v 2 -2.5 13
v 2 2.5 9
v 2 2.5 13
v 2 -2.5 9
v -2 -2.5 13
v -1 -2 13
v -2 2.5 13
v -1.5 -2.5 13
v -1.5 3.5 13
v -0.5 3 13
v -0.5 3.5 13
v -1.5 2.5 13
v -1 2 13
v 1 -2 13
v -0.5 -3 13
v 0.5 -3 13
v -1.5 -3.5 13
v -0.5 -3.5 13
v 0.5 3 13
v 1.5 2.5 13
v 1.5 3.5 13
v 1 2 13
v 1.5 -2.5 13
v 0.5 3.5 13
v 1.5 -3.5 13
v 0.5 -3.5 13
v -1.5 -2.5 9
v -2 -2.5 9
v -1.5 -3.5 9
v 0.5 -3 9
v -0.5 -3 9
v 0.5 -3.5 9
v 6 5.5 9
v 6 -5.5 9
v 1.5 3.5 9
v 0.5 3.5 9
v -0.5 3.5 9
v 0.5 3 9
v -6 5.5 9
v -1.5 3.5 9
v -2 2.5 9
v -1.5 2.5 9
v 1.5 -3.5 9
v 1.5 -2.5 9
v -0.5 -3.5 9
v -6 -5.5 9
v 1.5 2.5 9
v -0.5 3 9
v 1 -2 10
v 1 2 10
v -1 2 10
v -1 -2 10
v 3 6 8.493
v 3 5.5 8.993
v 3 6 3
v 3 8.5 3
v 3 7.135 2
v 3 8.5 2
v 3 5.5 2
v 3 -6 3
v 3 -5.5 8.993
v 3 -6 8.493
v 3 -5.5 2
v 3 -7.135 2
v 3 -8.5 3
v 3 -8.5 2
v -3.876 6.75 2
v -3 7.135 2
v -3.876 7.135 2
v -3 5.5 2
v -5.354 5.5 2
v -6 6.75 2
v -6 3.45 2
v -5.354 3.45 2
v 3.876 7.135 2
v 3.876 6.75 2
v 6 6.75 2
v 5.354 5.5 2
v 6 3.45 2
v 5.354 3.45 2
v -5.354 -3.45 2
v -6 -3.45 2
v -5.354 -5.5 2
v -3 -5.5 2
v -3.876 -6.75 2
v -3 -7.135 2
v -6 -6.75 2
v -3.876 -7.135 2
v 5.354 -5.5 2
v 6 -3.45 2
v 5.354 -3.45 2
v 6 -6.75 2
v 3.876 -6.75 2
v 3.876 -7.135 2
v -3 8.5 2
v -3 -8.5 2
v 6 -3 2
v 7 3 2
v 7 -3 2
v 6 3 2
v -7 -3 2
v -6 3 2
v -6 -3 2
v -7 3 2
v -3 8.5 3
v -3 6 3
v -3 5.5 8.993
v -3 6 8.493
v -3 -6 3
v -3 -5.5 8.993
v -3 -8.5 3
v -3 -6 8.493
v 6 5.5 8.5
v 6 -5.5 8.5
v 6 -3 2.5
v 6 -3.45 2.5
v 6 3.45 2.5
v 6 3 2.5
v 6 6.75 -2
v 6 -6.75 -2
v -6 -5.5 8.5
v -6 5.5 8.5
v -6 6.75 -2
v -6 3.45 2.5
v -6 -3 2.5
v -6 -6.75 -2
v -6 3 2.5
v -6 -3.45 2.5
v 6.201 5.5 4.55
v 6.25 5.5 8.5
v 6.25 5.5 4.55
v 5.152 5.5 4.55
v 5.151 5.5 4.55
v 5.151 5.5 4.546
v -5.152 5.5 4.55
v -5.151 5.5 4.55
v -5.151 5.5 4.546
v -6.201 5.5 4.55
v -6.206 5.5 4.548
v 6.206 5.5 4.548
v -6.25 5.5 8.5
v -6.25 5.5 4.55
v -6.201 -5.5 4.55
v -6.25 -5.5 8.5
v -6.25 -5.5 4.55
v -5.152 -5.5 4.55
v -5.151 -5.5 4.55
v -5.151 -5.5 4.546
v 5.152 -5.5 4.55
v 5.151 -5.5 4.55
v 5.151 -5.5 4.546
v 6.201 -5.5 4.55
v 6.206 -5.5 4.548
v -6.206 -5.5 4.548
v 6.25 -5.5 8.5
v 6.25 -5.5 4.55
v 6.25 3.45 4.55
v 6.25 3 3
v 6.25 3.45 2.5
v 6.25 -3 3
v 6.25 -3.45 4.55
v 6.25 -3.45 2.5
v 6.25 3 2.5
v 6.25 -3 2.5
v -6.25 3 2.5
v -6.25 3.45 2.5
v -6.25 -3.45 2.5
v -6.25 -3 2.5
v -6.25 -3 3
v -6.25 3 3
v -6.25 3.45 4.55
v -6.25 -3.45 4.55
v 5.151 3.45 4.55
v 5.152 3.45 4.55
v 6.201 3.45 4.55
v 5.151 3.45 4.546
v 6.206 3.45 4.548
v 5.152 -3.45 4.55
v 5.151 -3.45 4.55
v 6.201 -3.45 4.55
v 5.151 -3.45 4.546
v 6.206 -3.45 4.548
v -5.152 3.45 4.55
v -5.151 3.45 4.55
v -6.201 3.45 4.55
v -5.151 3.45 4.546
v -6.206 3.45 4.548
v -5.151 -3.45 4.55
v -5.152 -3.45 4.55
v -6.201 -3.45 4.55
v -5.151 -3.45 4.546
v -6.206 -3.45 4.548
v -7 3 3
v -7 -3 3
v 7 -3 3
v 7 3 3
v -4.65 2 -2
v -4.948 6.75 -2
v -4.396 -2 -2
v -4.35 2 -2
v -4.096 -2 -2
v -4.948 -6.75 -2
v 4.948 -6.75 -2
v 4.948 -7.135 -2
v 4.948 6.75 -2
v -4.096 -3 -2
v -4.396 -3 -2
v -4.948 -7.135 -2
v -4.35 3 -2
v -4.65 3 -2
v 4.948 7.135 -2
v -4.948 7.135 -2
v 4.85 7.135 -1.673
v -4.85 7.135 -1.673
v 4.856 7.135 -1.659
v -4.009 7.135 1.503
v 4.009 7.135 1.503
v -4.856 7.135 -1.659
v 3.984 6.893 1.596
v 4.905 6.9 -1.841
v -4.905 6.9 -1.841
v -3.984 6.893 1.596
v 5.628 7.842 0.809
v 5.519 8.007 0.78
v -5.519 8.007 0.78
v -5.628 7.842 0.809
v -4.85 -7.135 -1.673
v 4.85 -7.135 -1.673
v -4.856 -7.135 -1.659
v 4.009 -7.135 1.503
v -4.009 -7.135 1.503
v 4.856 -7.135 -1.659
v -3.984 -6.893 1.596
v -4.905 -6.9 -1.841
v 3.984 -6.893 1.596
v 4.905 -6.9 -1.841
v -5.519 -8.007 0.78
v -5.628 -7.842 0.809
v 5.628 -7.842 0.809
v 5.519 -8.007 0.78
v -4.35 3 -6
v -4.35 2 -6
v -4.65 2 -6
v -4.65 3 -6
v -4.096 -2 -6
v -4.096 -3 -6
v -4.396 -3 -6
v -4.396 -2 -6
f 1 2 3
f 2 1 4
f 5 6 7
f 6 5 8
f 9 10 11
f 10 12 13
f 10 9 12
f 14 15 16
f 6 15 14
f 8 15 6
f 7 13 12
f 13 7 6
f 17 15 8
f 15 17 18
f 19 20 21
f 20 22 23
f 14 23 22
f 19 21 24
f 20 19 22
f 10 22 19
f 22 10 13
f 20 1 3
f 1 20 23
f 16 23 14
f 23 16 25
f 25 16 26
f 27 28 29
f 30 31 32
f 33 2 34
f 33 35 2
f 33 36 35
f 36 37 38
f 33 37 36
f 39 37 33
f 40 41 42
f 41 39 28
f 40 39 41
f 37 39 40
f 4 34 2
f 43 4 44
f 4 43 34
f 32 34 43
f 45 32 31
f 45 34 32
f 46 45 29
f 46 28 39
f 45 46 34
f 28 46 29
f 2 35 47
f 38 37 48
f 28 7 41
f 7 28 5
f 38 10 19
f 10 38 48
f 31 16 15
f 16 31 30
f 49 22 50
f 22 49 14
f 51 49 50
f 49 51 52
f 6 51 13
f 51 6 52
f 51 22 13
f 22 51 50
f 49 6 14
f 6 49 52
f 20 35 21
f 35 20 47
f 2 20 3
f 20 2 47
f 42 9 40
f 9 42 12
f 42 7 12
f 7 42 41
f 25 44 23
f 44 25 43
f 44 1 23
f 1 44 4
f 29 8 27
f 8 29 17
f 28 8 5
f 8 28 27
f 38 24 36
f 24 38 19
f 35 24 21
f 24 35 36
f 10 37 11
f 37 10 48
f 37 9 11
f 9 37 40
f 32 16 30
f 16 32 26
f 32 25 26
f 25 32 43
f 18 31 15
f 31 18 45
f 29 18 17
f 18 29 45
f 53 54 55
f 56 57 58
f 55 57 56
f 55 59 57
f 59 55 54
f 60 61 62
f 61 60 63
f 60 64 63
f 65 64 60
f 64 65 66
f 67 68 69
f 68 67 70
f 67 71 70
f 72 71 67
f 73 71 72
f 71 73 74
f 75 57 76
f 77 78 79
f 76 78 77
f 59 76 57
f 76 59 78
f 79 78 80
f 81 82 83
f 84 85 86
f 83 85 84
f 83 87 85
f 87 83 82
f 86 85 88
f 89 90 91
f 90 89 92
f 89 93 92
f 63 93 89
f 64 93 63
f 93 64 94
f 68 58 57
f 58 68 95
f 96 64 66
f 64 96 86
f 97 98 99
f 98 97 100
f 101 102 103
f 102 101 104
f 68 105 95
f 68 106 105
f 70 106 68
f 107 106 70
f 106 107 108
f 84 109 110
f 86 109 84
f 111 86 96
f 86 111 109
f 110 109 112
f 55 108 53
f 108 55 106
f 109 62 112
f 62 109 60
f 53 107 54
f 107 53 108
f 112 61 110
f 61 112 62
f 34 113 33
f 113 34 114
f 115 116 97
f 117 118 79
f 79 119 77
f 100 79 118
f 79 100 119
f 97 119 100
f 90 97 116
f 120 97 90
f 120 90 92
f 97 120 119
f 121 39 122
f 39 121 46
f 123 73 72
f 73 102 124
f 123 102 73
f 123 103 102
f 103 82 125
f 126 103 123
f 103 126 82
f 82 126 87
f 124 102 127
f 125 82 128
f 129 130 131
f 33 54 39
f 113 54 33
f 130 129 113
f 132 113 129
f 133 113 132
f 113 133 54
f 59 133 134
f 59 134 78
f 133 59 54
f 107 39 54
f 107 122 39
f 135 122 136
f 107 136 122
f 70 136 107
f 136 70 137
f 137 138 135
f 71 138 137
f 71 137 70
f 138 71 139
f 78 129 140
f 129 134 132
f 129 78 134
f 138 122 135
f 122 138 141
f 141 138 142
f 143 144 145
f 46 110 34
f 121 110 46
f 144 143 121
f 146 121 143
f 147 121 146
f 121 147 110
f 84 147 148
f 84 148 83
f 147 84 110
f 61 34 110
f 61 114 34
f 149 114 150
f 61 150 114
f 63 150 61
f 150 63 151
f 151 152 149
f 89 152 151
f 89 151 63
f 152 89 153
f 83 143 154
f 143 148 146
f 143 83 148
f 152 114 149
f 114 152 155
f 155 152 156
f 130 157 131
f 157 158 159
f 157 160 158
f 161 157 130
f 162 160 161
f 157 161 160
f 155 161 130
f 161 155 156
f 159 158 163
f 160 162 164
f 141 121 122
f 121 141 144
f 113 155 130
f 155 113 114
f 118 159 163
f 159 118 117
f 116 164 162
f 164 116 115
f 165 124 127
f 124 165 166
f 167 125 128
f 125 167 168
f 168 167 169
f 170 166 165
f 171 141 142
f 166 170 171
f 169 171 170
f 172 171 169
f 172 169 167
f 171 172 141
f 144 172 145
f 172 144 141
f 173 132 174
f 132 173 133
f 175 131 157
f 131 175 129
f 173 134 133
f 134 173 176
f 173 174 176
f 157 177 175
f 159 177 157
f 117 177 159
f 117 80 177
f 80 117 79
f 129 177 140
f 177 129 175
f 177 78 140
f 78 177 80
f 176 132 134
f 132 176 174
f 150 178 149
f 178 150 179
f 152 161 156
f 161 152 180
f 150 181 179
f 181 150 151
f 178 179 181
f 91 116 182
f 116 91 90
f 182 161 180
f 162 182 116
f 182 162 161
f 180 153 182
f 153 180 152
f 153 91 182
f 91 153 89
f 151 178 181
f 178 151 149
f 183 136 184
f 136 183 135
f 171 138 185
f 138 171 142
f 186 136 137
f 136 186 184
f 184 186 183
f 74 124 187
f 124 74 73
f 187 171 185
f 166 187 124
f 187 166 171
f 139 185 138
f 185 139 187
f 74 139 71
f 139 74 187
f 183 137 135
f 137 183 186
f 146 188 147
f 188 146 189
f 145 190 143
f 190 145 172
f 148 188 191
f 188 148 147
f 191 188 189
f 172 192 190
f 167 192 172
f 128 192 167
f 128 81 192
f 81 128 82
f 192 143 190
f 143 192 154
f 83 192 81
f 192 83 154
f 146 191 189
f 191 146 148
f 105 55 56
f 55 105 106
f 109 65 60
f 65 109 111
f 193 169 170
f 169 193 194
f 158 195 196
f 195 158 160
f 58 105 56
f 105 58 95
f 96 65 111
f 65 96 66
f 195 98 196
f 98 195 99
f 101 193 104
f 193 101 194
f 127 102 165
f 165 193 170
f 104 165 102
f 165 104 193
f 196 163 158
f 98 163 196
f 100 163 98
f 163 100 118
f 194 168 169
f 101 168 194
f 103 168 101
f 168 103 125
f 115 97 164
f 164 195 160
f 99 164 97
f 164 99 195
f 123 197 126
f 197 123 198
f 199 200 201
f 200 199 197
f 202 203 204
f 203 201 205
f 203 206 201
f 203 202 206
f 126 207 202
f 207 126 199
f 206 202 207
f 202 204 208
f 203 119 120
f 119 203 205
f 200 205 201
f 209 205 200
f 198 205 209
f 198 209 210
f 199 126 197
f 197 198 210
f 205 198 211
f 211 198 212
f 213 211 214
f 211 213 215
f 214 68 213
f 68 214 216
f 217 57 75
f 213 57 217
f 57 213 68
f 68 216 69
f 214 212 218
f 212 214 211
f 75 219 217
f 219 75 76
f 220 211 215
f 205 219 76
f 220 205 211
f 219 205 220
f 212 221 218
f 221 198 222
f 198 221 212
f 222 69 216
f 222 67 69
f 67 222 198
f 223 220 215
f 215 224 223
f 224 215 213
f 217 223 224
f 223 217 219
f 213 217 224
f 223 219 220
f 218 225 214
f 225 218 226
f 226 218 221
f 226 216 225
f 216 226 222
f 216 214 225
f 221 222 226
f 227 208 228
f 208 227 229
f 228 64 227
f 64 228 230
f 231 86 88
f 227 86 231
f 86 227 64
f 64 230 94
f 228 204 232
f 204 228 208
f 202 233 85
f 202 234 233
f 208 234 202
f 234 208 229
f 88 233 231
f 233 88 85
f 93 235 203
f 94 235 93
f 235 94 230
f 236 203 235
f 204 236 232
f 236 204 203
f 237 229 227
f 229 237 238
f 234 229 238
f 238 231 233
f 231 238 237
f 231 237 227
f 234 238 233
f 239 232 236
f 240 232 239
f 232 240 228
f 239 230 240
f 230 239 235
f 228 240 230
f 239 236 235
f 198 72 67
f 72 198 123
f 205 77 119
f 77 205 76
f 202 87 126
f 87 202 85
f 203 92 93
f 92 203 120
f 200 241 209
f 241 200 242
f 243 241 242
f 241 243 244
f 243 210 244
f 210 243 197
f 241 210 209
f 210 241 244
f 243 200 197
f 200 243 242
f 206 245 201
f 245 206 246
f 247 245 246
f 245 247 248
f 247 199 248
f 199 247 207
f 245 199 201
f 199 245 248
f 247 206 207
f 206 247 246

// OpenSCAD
// By qwelyt on thingiverse. 
// https://www.thingiverse.com/thing:3829342
// Licensed under the Creative Commons - Attribution - Share Alike license.
module stem(){
  difference(){
    cube([4,6,4],center=true);
    translate([0,0,1])cube([2,4,4],center=true);
    translate([2,3,0])cube([1,1,4.2],center=true);
    translate([-2,3,0])cube([1,1,4.2],center=true);
    translate([2,-3,0])cube([1,1,4.2],center=true);
    translate([-2,-3,0])cube([1,1,4.2],center=true);
  }
  
  
  translate([1,3,0])cube([1,1,4],center=true);
  translate([-1,3,0])cube([1,1,4],center=true);
  translate([1,-3,0])cube([1,1,4],center=true);
  translate([-1,-3,0])cube([1,1,4],center=true);
}

module top(){
  module d(){
    difference(){
      cube([1.1,2.1,3.1],center=true);
      translate([-0.54,0,0])rotate([0,18.5,0])cube([1,2.2,3.6],center=true);
    }
  }
  
  cube([6,17,1],center=true);
  cube([14,6,1],center=true);

  translate([0,0,3]){
    difference(){
      union(){
        cube([12,11,7],center=true);
        cube([12.5,11,6],center=true);
        difference(){
          cube([6,12,7],center=true);
          translate([0,6,3.7])rotate([45,0,0])cube([7,1,2],center=true);
          translate([0,-6,3.7])rotate([-45,0,0])cube([7,1,2],center=true);
        }
        
      }
      translate([12*0.5-0.299,11*0.5-1,-2.5])d();
      translate([12*0.5-0.299,-11*0.5+1,-2.5])d();
      
      translate([-12*0.5+0.299,11*0.5-1,-2.5])rotate([0,0,180])d();
      translate([-12*0.5+0.299,-11*0.5+1,-2.5])rotate([0,0,180])d();
    }
  }
}

module bottom(){
  
  module f(){
    difference(){
      cube([3,0.2,3],center=true);
      translate([-1.05,0,-1.05])rotate([0,45,0])cube([6,0.5,3],center=true);
    }
  }

  module bSide(){
    difference(){
      cube([10,0.5,4],center=true);
    
      translate([7,0,0])rotate([0,-15,0])cube([5,1,6],center=true);
      translate([-7,0,0])rotate([0,15,0])cube([5,1,6],center=true);
    }
    
    module e(){translate([4,-0.14,0])rotate([-9,45/2,30])f();}
    
    e();
    mirror([1,0,0])e();
  }
  
  cube([12,13.5,4],center=true);
  translate([0,13.5*0.51,0])bSide();
  translate([0,-13.5*0.51,0])rotate([0,0,180])bSide();
}

module legs(){
  module leg(){
    cube([0.3,1,4],center=true);
  }
  
  translate([0,2.5,0])leg();
  translate([0.254,-2.5,0])leg();
}

translate([0,0,11])stem();
translate([0,0,2.5])top();
bottom();
translate([-(13*0.5-2),0,-4])legs();
  
